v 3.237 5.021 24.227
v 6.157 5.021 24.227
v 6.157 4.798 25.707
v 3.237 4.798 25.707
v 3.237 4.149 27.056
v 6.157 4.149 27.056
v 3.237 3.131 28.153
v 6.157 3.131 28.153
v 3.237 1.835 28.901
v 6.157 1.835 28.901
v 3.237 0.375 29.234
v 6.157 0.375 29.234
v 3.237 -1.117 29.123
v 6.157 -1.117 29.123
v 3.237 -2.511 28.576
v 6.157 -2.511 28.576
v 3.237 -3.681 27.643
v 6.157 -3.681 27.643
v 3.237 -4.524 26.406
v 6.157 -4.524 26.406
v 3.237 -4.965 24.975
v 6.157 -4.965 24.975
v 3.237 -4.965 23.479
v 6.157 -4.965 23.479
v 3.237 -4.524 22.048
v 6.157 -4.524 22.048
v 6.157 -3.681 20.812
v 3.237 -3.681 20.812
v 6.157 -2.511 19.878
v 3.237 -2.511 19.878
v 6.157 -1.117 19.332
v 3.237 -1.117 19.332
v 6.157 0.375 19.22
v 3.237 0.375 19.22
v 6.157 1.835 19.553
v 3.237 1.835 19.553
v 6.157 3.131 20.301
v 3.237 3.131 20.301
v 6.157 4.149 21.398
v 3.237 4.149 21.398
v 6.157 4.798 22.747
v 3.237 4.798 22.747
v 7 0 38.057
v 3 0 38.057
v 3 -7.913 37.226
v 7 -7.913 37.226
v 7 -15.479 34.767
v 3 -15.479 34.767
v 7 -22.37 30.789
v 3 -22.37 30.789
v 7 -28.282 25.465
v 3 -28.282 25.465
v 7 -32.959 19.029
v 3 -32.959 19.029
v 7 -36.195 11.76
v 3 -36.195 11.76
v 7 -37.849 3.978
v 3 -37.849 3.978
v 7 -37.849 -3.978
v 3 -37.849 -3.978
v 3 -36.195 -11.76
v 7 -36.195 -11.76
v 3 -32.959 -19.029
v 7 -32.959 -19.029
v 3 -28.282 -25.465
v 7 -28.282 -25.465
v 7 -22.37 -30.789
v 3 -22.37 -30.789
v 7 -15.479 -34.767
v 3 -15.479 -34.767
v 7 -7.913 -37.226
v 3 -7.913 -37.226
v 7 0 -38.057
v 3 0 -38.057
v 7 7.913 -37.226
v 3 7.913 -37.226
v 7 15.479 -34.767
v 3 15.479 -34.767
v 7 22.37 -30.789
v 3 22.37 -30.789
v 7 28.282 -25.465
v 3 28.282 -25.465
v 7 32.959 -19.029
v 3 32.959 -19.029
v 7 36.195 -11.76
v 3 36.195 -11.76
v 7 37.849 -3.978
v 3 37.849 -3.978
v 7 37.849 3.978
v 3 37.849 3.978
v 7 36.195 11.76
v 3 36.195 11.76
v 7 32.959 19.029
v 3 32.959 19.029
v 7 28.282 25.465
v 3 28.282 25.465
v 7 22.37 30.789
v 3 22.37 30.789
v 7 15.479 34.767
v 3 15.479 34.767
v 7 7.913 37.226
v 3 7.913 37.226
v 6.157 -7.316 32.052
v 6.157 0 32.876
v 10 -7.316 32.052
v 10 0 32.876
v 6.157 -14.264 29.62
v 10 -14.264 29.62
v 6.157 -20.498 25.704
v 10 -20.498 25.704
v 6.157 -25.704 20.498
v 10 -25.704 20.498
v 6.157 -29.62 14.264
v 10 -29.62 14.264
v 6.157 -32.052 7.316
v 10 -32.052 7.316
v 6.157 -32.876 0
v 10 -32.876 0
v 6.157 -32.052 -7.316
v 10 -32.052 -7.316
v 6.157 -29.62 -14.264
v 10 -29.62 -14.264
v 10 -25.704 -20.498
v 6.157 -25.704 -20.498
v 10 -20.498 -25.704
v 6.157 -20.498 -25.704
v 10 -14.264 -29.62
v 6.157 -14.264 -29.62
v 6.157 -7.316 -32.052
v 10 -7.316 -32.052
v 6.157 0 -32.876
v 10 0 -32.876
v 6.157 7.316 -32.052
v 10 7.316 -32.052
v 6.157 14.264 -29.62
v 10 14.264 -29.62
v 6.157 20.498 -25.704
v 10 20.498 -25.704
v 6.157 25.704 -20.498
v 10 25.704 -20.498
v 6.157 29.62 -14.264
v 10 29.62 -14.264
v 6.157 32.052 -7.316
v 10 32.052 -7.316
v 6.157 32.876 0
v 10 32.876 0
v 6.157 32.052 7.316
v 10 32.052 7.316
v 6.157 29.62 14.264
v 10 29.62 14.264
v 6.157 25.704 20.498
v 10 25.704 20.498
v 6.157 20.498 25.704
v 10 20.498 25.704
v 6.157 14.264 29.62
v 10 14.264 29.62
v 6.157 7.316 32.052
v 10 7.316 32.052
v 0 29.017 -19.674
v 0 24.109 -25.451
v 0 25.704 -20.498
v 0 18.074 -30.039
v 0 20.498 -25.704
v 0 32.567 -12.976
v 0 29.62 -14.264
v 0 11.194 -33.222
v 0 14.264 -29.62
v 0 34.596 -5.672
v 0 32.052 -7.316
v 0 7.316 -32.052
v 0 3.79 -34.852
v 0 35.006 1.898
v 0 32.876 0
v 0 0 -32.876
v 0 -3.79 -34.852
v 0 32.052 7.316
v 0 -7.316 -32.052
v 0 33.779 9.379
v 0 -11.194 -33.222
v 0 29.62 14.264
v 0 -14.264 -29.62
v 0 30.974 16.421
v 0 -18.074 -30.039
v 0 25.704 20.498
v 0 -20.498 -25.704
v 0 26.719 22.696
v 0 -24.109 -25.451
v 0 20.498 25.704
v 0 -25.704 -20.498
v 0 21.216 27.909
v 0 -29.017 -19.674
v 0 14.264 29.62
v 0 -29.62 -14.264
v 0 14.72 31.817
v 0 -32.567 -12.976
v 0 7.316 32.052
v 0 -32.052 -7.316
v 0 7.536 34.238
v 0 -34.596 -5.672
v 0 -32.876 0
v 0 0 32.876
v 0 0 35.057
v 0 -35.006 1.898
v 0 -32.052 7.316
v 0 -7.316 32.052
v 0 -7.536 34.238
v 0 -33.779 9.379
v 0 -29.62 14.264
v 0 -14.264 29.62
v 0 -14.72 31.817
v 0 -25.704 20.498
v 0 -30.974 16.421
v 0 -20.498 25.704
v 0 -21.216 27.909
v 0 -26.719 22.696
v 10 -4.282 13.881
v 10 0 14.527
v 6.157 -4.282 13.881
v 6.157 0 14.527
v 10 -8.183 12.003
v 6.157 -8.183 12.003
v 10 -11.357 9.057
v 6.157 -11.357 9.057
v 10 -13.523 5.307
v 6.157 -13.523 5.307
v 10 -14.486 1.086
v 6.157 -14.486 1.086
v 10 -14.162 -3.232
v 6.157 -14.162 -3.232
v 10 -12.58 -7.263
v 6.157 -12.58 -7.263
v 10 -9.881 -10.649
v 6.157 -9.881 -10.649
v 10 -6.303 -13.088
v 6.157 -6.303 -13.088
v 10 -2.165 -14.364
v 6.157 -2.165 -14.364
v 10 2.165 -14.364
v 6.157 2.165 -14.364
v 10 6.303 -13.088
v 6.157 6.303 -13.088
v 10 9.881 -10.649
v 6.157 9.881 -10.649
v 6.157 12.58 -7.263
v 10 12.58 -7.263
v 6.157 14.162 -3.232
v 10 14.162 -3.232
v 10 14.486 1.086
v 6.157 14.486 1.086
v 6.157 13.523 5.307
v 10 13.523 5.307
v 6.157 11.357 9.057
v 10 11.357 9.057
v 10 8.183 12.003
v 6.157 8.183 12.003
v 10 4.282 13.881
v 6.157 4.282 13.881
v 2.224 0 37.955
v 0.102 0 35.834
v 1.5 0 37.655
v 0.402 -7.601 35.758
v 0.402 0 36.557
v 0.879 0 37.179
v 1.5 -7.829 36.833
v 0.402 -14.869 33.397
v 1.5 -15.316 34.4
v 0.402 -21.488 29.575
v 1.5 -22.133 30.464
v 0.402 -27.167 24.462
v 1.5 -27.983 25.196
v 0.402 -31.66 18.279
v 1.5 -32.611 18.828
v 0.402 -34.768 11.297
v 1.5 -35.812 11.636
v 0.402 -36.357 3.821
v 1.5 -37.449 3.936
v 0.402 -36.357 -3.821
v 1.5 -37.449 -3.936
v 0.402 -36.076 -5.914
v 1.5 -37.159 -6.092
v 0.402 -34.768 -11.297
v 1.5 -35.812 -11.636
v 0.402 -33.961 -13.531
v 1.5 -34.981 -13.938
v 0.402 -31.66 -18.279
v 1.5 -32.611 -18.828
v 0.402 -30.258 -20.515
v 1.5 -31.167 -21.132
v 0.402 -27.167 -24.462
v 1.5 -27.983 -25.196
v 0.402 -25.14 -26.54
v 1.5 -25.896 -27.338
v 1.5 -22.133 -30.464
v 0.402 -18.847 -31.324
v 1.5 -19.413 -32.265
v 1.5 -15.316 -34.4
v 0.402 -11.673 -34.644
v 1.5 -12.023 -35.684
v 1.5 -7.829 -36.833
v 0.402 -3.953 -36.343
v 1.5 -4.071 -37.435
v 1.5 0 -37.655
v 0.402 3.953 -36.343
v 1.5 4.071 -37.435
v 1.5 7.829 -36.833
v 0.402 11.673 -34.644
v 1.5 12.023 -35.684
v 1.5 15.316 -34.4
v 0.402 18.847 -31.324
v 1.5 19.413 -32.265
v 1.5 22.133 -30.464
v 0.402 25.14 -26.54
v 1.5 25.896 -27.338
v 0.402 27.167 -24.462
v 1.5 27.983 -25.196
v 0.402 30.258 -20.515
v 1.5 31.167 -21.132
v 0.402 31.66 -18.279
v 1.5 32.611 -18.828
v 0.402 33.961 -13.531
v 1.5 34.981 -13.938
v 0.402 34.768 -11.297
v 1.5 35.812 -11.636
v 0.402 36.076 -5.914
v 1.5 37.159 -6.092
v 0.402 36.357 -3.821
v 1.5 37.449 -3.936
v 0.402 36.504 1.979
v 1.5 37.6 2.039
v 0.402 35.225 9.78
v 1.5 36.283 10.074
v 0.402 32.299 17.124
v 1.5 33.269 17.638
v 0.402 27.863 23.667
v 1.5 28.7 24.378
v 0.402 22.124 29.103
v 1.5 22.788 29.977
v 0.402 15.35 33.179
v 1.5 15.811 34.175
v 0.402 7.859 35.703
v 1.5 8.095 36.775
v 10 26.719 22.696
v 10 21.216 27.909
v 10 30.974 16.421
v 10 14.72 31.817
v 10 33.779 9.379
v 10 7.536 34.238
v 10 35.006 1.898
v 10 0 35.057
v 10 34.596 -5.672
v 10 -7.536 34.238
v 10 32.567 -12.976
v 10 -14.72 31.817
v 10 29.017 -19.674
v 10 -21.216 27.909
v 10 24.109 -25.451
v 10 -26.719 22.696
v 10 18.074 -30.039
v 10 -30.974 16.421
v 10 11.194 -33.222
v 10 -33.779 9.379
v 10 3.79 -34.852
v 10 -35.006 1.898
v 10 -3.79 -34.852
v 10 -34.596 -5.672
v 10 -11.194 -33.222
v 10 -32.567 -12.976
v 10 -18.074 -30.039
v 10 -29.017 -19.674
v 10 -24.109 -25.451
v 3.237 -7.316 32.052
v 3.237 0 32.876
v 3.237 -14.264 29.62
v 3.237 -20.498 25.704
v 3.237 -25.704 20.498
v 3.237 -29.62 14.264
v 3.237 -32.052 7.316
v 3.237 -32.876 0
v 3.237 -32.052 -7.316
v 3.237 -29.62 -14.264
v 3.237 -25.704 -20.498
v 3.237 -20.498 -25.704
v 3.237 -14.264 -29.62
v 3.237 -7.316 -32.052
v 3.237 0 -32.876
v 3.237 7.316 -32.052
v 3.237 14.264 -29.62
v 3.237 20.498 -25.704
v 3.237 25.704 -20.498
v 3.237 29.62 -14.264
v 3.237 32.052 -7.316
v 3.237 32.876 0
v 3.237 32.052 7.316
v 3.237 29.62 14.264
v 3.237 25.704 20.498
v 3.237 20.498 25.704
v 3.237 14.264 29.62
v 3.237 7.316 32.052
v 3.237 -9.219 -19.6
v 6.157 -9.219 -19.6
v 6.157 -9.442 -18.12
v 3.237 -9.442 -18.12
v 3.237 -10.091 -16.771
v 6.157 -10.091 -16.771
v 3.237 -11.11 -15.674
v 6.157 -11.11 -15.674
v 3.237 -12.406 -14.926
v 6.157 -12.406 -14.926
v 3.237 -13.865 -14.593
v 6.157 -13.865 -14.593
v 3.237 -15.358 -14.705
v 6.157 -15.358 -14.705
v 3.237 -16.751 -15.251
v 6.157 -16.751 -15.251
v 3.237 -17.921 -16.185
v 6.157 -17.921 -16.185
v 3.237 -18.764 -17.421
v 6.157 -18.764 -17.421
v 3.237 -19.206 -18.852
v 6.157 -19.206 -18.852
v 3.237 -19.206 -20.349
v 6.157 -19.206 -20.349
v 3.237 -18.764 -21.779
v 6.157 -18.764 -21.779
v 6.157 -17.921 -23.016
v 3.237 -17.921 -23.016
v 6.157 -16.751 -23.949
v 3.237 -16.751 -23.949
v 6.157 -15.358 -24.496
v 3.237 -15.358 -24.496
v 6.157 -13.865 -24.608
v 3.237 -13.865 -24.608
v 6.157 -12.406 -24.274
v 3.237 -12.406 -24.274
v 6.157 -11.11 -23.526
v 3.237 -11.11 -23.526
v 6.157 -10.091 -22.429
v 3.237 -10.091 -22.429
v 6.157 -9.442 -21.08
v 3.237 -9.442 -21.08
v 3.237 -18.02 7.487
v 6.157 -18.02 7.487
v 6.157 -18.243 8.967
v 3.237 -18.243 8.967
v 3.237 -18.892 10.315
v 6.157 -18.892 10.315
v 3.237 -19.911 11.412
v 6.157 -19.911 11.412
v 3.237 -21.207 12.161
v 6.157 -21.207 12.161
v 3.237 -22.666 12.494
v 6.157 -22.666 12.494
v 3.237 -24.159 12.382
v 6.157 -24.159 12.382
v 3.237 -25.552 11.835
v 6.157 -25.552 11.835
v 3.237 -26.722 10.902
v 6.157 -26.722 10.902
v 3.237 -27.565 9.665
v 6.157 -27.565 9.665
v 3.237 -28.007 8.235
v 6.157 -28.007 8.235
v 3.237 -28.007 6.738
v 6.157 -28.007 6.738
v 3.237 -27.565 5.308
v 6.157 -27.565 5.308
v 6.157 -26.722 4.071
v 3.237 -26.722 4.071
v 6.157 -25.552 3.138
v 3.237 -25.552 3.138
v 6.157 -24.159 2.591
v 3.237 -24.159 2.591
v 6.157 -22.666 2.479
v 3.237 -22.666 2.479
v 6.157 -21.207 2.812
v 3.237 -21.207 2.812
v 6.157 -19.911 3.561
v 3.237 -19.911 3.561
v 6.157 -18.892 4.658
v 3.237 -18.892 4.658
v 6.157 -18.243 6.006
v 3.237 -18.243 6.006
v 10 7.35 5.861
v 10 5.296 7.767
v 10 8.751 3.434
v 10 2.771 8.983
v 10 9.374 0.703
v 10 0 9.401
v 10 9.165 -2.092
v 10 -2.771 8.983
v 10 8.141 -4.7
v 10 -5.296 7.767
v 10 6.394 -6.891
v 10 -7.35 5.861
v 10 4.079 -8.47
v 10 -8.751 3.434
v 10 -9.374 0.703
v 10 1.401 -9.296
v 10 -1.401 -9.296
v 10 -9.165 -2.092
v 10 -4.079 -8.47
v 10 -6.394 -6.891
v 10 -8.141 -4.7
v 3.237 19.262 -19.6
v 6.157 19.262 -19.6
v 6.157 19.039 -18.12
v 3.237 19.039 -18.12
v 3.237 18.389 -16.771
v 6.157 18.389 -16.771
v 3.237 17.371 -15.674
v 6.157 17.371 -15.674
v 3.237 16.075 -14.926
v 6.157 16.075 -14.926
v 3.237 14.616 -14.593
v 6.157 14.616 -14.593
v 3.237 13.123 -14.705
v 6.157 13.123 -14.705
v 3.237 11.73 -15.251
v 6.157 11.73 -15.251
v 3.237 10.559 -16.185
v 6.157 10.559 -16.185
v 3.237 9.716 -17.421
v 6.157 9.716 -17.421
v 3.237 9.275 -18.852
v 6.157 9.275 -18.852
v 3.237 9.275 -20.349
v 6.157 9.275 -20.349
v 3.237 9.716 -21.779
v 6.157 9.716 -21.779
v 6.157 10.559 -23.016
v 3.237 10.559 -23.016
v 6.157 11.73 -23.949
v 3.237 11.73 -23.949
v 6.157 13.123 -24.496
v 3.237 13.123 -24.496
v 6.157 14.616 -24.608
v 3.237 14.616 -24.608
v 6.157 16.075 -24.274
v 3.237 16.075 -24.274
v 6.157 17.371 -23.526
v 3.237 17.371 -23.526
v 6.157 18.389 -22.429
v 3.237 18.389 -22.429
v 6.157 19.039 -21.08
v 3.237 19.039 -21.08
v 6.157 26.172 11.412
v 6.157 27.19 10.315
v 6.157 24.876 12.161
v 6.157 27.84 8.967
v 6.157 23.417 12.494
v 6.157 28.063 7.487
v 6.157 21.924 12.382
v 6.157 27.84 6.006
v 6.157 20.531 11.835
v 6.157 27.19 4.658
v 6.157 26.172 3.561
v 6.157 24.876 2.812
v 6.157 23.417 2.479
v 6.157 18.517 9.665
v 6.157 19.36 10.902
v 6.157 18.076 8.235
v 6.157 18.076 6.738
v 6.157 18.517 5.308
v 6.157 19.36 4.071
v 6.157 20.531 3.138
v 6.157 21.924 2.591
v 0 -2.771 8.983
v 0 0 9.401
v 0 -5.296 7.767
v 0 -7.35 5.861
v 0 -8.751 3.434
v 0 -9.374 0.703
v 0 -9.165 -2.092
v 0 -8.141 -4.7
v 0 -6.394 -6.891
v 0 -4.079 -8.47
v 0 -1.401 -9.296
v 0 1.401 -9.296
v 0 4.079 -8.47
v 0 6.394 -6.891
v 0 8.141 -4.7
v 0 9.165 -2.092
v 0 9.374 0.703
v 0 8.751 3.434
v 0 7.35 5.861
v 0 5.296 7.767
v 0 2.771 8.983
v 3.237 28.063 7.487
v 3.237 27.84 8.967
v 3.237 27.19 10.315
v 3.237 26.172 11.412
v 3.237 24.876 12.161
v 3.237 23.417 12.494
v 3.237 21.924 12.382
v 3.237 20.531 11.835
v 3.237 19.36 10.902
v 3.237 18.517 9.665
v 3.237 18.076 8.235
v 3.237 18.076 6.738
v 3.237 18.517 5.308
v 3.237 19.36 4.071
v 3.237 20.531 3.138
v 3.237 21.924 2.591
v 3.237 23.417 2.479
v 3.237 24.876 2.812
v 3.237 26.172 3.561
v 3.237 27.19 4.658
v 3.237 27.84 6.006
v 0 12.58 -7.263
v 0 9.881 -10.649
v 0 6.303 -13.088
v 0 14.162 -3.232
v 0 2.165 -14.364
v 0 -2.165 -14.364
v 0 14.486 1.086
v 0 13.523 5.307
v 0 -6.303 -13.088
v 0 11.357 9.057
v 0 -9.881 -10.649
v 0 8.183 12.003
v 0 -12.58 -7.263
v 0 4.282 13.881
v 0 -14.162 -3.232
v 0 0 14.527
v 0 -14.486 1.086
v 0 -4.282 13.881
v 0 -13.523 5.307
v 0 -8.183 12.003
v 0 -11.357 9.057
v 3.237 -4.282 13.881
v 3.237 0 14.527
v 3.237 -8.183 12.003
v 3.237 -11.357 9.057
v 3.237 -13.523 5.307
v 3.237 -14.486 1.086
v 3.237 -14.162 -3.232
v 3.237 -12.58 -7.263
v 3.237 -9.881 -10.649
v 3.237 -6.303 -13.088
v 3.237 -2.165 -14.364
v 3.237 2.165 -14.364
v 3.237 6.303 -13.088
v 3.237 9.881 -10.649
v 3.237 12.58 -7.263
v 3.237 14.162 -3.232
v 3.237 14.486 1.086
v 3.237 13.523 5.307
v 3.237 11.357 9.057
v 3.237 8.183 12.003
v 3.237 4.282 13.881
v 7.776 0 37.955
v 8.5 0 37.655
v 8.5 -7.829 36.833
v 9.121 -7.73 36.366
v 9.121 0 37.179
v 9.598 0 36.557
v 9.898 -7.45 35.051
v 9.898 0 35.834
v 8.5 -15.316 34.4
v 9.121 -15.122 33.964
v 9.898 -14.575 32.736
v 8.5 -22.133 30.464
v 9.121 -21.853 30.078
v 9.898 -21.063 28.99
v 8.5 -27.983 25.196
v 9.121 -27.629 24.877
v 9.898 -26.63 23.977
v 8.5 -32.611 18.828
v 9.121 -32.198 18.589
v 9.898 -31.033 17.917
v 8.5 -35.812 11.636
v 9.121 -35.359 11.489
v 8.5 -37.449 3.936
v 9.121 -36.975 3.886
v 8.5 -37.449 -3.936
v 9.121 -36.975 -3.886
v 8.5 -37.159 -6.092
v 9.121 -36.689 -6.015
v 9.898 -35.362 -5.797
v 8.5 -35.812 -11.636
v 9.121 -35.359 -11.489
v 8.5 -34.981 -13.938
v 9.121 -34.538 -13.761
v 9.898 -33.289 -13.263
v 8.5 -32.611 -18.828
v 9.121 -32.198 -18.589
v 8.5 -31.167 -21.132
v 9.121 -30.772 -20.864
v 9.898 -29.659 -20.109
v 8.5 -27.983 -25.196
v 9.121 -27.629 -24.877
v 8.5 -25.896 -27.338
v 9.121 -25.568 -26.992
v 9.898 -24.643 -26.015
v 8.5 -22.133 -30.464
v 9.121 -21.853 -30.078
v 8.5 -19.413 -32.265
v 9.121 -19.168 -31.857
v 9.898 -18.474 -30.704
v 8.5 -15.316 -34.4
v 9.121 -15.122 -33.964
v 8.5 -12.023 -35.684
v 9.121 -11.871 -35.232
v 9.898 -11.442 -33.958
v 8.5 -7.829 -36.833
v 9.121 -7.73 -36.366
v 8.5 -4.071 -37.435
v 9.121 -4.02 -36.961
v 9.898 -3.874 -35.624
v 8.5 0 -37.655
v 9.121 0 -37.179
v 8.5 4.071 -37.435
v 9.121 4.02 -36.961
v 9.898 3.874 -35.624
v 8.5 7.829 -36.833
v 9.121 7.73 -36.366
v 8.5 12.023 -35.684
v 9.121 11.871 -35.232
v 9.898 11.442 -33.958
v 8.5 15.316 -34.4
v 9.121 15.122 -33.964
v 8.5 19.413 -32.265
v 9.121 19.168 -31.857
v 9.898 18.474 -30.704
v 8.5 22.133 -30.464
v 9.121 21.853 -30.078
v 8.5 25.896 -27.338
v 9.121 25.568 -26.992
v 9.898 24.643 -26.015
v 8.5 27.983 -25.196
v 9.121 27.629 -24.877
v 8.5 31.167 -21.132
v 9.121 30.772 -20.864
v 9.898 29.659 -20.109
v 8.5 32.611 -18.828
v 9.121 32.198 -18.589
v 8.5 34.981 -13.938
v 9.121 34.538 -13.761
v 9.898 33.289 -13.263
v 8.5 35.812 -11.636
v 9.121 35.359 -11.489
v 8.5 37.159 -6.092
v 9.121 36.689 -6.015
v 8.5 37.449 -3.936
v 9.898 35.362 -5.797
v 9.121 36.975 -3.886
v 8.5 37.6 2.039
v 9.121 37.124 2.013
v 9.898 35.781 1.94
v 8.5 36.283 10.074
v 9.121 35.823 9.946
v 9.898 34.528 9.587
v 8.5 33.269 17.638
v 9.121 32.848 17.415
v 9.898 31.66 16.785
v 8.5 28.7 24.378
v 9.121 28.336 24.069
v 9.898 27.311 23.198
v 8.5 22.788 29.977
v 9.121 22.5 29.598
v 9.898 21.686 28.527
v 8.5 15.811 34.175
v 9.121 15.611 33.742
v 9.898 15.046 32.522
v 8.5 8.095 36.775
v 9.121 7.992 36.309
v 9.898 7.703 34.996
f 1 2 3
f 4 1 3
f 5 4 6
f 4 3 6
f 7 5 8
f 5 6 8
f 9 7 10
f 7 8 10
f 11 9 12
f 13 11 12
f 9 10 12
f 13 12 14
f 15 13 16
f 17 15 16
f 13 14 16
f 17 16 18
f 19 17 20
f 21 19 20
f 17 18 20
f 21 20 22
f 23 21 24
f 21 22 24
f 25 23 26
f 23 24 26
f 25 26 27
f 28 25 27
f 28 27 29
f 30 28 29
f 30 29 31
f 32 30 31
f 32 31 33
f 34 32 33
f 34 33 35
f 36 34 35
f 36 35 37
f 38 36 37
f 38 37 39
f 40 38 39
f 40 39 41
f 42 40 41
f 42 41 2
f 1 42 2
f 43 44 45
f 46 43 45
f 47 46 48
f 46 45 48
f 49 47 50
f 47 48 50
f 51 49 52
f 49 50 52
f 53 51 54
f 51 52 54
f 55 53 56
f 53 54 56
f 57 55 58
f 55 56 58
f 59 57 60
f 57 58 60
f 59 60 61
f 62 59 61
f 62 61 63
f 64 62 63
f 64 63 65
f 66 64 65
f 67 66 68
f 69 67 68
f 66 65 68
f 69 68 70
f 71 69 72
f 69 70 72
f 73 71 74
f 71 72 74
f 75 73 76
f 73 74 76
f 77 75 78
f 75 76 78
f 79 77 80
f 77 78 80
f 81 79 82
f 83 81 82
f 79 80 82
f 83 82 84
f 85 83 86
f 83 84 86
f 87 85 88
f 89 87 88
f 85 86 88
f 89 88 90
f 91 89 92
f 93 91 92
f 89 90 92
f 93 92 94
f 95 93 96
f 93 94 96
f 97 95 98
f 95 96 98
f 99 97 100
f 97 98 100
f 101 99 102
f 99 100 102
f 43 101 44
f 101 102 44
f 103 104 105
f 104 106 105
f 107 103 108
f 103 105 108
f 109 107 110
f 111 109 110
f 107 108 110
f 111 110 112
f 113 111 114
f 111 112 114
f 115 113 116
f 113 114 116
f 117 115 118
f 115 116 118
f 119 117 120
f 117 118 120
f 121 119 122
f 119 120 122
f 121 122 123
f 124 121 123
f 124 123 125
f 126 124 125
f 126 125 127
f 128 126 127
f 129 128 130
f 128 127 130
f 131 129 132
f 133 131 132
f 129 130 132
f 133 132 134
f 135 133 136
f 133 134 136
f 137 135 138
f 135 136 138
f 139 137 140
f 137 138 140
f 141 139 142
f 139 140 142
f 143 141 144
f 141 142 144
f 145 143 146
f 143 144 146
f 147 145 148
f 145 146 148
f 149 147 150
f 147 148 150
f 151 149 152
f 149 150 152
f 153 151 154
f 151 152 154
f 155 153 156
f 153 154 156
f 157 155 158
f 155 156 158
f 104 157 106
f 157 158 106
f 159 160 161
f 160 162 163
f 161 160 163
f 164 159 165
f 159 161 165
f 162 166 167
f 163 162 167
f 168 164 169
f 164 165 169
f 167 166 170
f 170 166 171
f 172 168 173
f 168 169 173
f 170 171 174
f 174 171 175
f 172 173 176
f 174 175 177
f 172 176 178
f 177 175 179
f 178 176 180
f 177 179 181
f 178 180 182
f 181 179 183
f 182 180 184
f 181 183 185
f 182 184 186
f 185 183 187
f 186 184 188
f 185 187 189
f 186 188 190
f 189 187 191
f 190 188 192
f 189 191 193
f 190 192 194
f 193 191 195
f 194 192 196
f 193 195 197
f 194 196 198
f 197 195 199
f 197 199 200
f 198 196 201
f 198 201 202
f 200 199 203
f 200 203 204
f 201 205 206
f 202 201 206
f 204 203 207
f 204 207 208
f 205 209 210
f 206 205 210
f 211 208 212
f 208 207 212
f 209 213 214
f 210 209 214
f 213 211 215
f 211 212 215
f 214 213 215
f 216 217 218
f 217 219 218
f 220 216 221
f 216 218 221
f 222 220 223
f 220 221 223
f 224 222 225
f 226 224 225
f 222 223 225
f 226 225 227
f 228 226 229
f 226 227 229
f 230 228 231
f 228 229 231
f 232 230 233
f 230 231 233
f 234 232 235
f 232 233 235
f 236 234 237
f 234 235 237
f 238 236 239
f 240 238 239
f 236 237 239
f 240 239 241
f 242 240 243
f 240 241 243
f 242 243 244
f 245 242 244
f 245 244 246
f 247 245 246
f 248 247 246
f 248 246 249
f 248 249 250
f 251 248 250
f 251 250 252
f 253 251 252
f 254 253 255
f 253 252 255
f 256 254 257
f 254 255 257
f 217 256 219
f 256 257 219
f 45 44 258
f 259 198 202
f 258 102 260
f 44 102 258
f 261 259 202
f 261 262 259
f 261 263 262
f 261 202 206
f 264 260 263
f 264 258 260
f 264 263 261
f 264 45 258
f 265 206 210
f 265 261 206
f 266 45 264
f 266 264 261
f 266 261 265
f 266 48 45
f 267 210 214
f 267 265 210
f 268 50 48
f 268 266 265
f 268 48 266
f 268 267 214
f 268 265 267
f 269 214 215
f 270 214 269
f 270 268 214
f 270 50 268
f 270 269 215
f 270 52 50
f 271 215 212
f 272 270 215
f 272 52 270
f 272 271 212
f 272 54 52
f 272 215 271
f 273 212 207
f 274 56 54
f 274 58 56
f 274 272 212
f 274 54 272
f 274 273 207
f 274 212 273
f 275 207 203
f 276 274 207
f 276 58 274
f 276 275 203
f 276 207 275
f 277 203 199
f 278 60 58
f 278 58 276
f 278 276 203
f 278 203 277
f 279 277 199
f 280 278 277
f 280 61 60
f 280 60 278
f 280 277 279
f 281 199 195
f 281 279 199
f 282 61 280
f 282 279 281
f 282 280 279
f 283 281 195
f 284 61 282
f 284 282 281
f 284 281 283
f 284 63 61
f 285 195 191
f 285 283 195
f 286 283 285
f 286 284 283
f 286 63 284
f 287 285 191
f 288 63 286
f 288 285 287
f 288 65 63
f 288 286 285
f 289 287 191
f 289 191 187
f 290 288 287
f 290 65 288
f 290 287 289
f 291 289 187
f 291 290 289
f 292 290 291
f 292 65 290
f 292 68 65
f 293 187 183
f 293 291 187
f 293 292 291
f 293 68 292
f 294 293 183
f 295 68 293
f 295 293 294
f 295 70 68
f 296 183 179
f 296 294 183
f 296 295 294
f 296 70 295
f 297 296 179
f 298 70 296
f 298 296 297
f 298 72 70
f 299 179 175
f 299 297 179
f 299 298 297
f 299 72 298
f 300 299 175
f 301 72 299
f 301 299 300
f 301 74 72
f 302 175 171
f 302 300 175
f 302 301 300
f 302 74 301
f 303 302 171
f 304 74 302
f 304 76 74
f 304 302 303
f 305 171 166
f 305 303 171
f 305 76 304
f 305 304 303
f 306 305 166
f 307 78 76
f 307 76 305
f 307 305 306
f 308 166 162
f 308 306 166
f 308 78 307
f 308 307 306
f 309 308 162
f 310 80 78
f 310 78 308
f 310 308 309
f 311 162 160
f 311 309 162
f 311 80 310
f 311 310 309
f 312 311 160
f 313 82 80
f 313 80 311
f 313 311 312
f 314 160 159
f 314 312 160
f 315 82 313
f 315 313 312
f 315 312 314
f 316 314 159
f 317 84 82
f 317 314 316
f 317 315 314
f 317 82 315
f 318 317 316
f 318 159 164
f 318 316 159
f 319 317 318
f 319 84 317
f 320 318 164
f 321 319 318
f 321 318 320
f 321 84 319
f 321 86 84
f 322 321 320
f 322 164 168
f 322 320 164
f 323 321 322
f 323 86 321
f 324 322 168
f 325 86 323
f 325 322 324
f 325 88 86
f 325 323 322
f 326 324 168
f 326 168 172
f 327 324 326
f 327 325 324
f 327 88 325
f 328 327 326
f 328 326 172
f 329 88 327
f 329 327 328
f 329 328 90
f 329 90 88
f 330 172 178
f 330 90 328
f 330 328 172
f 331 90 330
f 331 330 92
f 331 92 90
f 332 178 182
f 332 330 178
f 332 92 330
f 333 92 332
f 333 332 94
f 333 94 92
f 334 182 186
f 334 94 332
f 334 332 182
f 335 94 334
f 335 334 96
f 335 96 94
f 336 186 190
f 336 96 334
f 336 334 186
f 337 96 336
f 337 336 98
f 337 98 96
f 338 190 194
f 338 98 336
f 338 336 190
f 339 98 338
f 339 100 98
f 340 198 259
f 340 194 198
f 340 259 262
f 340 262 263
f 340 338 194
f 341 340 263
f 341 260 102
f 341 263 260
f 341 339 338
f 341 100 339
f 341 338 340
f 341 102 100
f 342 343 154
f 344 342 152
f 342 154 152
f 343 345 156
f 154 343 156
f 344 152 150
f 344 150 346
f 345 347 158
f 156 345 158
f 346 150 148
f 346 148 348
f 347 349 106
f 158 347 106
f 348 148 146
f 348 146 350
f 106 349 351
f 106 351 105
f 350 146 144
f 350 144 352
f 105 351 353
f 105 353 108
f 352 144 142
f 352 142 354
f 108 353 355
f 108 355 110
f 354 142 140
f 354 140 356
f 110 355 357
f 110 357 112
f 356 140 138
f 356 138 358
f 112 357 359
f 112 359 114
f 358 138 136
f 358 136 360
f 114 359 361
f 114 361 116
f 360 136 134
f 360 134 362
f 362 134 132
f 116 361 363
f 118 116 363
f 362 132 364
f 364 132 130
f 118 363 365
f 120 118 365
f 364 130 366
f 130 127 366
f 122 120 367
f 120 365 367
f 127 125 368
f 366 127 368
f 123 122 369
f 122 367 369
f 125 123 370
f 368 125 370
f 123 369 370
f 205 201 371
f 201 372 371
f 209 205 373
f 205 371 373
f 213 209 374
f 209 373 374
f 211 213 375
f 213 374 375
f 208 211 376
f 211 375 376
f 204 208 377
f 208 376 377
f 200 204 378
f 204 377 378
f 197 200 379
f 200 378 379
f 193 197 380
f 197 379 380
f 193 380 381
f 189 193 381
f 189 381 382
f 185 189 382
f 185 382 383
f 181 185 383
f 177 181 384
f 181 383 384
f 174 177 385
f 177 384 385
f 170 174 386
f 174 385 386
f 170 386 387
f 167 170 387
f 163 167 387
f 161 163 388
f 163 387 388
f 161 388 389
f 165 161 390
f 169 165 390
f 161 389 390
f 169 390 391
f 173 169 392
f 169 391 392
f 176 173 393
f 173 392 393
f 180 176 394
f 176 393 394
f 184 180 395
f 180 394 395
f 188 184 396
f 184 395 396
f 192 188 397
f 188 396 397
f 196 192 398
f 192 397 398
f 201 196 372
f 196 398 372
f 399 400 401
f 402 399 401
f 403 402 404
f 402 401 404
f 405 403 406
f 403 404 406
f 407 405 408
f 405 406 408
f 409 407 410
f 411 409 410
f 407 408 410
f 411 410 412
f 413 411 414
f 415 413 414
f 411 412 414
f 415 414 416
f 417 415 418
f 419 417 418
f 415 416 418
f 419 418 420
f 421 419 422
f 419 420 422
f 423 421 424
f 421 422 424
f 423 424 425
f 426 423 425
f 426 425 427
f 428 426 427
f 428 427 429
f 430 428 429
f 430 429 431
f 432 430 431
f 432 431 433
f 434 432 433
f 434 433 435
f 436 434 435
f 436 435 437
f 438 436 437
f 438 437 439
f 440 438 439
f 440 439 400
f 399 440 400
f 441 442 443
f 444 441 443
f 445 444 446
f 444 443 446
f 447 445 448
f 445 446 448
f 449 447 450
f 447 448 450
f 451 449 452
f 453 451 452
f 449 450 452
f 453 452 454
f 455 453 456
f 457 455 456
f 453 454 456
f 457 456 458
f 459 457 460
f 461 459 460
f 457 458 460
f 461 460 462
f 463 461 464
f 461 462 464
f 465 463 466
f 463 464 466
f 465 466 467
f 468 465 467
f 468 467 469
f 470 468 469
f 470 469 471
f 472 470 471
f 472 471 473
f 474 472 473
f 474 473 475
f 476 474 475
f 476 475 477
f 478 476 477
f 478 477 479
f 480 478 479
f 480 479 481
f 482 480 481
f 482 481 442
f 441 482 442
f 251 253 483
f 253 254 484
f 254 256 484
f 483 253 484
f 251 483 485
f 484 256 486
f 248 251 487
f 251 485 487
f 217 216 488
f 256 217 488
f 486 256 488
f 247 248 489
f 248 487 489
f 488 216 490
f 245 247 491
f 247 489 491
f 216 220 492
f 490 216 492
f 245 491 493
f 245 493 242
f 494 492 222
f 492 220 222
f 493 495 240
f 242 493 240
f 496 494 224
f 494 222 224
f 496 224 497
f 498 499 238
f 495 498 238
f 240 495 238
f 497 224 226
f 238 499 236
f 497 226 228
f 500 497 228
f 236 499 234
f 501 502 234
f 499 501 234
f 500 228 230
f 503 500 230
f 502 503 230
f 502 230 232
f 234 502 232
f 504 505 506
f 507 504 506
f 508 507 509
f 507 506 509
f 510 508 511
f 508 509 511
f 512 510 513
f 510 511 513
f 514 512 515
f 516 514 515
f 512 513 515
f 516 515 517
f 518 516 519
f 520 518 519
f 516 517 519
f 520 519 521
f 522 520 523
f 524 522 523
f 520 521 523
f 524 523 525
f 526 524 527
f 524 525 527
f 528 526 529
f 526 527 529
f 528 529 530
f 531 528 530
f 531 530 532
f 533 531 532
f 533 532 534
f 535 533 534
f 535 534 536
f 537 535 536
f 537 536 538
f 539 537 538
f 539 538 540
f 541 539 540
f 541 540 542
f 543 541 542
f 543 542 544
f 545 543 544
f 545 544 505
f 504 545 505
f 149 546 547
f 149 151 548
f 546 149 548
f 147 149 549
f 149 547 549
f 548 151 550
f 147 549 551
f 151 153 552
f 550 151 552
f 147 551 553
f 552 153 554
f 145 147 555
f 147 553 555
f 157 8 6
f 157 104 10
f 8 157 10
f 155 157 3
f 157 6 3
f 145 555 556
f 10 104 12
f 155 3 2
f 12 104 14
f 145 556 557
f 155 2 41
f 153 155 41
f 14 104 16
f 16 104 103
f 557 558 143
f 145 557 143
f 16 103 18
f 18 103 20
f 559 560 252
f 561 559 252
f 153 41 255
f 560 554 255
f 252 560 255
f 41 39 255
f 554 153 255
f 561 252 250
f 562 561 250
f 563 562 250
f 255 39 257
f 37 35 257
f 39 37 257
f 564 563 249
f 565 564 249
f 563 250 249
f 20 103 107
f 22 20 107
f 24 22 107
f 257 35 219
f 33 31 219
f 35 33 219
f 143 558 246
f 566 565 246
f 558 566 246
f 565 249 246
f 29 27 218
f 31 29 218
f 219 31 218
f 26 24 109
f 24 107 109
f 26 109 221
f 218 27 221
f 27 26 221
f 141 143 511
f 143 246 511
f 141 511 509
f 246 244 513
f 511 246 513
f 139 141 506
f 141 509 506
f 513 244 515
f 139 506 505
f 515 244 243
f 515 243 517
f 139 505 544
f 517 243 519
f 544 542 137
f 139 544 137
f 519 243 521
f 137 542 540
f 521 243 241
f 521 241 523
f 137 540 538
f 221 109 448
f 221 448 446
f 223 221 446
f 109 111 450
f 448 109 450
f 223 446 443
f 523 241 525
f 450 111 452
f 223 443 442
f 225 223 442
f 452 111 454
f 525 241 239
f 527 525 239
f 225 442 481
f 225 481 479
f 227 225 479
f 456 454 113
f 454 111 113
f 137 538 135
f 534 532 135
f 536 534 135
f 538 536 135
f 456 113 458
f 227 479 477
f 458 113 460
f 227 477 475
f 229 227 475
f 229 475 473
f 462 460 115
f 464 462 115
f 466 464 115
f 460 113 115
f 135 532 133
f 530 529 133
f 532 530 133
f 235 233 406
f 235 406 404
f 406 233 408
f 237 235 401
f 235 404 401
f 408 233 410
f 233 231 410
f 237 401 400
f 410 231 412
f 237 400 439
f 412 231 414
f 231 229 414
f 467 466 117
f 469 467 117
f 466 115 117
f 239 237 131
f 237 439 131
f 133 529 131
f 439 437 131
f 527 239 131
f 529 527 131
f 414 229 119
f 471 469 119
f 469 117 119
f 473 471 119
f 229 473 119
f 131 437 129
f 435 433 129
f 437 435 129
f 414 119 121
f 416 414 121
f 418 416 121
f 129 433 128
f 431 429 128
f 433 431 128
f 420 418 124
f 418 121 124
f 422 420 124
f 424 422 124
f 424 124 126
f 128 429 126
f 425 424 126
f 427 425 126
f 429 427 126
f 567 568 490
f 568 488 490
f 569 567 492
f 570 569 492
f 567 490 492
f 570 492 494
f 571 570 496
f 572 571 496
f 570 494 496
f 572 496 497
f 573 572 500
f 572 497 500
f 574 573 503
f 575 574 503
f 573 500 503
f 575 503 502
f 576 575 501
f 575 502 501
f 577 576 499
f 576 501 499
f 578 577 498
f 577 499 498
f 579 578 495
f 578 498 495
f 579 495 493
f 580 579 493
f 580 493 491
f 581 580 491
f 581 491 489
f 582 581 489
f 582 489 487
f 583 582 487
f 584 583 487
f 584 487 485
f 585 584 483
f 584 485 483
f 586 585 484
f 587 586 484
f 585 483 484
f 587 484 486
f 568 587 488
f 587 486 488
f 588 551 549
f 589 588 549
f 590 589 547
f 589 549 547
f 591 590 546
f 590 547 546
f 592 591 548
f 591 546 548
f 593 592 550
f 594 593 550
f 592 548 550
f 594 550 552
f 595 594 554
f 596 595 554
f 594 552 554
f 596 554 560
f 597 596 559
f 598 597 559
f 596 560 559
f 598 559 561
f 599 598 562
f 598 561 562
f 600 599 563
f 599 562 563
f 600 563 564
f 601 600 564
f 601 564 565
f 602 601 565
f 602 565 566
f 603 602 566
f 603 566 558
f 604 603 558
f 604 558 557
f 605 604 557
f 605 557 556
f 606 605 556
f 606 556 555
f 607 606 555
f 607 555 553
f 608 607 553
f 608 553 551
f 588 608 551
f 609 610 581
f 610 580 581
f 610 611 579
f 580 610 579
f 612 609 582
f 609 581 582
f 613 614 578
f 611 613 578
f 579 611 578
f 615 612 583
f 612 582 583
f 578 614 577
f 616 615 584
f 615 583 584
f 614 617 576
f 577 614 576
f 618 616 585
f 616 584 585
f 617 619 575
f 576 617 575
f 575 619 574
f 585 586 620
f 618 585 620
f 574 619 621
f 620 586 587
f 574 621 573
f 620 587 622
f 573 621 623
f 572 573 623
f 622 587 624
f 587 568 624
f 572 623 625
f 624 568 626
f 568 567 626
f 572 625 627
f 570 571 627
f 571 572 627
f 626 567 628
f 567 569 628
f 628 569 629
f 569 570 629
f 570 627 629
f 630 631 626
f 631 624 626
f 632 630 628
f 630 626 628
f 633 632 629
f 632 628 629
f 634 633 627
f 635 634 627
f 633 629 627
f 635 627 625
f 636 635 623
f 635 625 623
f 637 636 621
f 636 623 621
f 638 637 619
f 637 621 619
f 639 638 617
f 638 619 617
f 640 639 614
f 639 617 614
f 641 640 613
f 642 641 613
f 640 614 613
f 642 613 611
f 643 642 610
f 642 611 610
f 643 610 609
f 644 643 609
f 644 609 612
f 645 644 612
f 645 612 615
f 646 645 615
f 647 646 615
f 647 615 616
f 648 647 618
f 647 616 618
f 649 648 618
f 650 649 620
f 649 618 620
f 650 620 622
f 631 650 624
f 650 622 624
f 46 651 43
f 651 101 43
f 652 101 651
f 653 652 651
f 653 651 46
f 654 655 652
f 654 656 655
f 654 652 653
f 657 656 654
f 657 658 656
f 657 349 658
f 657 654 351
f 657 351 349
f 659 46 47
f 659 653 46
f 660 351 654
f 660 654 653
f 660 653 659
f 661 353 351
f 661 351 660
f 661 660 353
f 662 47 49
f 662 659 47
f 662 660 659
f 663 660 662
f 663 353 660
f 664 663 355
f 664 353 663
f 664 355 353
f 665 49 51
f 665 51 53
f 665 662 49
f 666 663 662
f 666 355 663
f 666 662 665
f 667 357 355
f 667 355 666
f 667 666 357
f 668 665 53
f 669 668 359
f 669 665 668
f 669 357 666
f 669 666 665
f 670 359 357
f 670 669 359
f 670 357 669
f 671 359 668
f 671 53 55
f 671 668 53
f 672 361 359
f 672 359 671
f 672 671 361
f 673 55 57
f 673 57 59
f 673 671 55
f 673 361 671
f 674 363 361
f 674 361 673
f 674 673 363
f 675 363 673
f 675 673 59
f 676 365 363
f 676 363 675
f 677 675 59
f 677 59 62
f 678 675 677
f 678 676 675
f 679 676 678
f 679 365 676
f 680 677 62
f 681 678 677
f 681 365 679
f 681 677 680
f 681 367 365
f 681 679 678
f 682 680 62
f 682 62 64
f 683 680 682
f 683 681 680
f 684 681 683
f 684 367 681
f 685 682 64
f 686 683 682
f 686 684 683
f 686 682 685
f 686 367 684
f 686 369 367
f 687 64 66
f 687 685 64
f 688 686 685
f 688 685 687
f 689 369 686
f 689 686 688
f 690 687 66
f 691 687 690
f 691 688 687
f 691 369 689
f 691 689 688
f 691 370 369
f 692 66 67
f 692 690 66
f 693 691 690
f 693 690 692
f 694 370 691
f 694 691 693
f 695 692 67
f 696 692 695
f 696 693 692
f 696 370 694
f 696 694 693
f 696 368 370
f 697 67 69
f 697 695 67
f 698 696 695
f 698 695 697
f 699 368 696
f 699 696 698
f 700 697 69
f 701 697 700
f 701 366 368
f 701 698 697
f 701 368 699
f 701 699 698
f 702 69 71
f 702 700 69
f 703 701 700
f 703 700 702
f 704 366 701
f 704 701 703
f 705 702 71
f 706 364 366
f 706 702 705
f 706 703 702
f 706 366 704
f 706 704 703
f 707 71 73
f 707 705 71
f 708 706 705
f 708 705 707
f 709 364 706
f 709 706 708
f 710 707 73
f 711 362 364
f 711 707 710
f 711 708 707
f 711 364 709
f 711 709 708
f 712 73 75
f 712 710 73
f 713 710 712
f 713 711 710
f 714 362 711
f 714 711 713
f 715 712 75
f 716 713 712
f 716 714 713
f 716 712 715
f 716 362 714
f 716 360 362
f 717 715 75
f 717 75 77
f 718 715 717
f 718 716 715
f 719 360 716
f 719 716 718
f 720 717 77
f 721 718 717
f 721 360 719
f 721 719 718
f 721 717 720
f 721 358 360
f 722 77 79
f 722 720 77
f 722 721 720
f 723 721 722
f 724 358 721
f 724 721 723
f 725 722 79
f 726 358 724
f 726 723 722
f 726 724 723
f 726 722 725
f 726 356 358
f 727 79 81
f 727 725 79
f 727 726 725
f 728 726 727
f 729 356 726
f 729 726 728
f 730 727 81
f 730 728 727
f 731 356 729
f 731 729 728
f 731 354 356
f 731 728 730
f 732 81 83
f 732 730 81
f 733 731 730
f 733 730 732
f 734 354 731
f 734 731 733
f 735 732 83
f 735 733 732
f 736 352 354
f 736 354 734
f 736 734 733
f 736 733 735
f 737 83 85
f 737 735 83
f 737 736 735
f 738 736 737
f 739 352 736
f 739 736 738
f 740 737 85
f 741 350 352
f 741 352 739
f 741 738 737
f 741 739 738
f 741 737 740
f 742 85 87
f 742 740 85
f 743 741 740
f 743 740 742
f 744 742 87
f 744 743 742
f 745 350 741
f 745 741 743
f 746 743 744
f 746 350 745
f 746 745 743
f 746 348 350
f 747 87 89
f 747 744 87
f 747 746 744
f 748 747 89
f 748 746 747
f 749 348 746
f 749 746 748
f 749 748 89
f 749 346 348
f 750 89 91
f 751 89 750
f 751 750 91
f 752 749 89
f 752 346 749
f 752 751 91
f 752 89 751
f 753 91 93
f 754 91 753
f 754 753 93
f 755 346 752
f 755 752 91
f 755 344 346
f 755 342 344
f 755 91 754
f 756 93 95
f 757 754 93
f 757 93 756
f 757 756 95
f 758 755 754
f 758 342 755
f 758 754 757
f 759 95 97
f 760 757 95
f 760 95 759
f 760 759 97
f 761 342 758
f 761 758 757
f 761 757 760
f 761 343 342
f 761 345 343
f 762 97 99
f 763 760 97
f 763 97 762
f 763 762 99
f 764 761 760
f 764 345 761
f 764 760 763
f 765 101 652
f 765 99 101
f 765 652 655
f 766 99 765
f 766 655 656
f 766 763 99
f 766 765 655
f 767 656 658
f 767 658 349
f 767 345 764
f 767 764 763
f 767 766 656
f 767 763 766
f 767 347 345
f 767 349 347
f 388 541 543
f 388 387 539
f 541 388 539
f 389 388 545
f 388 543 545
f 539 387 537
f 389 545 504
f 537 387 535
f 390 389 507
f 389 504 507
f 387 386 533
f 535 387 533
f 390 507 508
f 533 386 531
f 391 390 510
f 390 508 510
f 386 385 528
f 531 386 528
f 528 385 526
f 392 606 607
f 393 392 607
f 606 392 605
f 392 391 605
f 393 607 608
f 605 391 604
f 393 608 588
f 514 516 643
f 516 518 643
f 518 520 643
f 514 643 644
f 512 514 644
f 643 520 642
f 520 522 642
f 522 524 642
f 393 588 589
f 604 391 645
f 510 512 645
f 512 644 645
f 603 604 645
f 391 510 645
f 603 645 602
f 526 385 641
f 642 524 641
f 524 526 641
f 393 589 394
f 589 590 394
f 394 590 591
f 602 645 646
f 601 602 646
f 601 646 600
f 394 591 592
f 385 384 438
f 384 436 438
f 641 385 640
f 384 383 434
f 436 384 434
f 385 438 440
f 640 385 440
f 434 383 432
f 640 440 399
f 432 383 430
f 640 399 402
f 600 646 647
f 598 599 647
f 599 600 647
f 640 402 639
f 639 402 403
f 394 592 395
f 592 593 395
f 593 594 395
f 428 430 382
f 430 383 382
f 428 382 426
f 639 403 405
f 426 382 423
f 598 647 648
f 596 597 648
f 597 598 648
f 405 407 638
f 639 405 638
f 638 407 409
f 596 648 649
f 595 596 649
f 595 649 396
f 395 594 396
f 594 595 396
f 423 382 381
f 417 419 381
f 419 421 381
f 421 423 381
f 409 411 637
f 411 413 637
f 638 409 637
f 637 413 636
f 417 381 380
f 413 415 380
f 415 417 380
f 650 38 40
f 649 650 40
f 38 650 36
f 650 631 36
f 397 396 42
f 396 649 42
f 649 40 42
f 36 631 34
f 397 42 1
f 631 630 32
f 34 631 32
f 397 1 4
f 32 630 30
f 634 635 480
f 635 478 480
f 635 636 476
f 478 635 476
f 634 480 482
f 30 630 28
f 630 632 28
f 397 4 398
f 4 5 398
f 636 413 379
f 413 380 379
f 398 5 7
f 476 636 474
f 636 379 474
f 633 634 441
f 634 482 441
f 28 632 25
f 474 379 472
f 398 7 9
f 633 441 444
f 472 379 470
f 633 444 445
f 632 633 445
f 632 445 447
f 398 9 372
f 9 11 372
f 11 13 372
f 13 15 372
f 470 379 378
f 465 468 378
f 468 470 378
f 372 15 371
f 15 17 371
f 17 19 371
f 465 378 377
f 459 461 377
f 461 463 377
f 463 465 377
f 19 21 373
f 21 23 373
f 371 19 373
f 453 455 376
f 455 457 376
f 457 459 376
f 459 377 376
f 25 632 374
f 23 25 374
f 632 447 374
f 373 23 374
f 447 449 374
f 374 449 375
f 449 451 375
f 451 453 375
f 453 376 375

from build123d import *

# Parameters (mm, degrees)
F2_R     = 5.021426
F3_DEPTH = 25
F4_R     = 3


with BuildPart() as f1:
    # F0 (on Front) → F1 (revolve)
    with BuildSketch(Plane.XZ):
        Polygon((0, 14.5267), (0, 9.400629), (10, 9.400629), (10, 14.5267), (6.157054, 14.5267), (6.157054, 32.876216), (10, 32.876216), (10, 38.057327), (0, 38.057327), (0, 32.876216), (3.236998, 32.876216), (3.236998, 14.5267), align=None)
    revolve(axis=Axis((5, 0, 0), (1, 0, 0)))

    # F2 (on face) → F3 (cut)
    with BuildSketch(Plane.YZ.offset(6.157054)):
        with Locations((-23.041325, 7.48658)):
            Circle(F2_R)
        with Locations((0, 24.227083)):
            Circle(F2_R)
        with Locations((23.041325, 7.48658)):
            Circle(F2_R)
        with Locations((14.240322, -19.600122)):
            Circle(F2_R)
        with Locations((-14.240322, -19.600122)):
            Circle(F2_R)
    extrude(amount=-F3_DEPTH, mode=Mode.SUBTRACT)

    # F4
    f4_edges = [f1.edges().sort_by_distance(p)[0] for p in [
        (0, 0, -38.057327),
        (10, 0, -38.057327),
    ]]
    fillet(f4_edges, radius=F4_R)


solid = f1.part
